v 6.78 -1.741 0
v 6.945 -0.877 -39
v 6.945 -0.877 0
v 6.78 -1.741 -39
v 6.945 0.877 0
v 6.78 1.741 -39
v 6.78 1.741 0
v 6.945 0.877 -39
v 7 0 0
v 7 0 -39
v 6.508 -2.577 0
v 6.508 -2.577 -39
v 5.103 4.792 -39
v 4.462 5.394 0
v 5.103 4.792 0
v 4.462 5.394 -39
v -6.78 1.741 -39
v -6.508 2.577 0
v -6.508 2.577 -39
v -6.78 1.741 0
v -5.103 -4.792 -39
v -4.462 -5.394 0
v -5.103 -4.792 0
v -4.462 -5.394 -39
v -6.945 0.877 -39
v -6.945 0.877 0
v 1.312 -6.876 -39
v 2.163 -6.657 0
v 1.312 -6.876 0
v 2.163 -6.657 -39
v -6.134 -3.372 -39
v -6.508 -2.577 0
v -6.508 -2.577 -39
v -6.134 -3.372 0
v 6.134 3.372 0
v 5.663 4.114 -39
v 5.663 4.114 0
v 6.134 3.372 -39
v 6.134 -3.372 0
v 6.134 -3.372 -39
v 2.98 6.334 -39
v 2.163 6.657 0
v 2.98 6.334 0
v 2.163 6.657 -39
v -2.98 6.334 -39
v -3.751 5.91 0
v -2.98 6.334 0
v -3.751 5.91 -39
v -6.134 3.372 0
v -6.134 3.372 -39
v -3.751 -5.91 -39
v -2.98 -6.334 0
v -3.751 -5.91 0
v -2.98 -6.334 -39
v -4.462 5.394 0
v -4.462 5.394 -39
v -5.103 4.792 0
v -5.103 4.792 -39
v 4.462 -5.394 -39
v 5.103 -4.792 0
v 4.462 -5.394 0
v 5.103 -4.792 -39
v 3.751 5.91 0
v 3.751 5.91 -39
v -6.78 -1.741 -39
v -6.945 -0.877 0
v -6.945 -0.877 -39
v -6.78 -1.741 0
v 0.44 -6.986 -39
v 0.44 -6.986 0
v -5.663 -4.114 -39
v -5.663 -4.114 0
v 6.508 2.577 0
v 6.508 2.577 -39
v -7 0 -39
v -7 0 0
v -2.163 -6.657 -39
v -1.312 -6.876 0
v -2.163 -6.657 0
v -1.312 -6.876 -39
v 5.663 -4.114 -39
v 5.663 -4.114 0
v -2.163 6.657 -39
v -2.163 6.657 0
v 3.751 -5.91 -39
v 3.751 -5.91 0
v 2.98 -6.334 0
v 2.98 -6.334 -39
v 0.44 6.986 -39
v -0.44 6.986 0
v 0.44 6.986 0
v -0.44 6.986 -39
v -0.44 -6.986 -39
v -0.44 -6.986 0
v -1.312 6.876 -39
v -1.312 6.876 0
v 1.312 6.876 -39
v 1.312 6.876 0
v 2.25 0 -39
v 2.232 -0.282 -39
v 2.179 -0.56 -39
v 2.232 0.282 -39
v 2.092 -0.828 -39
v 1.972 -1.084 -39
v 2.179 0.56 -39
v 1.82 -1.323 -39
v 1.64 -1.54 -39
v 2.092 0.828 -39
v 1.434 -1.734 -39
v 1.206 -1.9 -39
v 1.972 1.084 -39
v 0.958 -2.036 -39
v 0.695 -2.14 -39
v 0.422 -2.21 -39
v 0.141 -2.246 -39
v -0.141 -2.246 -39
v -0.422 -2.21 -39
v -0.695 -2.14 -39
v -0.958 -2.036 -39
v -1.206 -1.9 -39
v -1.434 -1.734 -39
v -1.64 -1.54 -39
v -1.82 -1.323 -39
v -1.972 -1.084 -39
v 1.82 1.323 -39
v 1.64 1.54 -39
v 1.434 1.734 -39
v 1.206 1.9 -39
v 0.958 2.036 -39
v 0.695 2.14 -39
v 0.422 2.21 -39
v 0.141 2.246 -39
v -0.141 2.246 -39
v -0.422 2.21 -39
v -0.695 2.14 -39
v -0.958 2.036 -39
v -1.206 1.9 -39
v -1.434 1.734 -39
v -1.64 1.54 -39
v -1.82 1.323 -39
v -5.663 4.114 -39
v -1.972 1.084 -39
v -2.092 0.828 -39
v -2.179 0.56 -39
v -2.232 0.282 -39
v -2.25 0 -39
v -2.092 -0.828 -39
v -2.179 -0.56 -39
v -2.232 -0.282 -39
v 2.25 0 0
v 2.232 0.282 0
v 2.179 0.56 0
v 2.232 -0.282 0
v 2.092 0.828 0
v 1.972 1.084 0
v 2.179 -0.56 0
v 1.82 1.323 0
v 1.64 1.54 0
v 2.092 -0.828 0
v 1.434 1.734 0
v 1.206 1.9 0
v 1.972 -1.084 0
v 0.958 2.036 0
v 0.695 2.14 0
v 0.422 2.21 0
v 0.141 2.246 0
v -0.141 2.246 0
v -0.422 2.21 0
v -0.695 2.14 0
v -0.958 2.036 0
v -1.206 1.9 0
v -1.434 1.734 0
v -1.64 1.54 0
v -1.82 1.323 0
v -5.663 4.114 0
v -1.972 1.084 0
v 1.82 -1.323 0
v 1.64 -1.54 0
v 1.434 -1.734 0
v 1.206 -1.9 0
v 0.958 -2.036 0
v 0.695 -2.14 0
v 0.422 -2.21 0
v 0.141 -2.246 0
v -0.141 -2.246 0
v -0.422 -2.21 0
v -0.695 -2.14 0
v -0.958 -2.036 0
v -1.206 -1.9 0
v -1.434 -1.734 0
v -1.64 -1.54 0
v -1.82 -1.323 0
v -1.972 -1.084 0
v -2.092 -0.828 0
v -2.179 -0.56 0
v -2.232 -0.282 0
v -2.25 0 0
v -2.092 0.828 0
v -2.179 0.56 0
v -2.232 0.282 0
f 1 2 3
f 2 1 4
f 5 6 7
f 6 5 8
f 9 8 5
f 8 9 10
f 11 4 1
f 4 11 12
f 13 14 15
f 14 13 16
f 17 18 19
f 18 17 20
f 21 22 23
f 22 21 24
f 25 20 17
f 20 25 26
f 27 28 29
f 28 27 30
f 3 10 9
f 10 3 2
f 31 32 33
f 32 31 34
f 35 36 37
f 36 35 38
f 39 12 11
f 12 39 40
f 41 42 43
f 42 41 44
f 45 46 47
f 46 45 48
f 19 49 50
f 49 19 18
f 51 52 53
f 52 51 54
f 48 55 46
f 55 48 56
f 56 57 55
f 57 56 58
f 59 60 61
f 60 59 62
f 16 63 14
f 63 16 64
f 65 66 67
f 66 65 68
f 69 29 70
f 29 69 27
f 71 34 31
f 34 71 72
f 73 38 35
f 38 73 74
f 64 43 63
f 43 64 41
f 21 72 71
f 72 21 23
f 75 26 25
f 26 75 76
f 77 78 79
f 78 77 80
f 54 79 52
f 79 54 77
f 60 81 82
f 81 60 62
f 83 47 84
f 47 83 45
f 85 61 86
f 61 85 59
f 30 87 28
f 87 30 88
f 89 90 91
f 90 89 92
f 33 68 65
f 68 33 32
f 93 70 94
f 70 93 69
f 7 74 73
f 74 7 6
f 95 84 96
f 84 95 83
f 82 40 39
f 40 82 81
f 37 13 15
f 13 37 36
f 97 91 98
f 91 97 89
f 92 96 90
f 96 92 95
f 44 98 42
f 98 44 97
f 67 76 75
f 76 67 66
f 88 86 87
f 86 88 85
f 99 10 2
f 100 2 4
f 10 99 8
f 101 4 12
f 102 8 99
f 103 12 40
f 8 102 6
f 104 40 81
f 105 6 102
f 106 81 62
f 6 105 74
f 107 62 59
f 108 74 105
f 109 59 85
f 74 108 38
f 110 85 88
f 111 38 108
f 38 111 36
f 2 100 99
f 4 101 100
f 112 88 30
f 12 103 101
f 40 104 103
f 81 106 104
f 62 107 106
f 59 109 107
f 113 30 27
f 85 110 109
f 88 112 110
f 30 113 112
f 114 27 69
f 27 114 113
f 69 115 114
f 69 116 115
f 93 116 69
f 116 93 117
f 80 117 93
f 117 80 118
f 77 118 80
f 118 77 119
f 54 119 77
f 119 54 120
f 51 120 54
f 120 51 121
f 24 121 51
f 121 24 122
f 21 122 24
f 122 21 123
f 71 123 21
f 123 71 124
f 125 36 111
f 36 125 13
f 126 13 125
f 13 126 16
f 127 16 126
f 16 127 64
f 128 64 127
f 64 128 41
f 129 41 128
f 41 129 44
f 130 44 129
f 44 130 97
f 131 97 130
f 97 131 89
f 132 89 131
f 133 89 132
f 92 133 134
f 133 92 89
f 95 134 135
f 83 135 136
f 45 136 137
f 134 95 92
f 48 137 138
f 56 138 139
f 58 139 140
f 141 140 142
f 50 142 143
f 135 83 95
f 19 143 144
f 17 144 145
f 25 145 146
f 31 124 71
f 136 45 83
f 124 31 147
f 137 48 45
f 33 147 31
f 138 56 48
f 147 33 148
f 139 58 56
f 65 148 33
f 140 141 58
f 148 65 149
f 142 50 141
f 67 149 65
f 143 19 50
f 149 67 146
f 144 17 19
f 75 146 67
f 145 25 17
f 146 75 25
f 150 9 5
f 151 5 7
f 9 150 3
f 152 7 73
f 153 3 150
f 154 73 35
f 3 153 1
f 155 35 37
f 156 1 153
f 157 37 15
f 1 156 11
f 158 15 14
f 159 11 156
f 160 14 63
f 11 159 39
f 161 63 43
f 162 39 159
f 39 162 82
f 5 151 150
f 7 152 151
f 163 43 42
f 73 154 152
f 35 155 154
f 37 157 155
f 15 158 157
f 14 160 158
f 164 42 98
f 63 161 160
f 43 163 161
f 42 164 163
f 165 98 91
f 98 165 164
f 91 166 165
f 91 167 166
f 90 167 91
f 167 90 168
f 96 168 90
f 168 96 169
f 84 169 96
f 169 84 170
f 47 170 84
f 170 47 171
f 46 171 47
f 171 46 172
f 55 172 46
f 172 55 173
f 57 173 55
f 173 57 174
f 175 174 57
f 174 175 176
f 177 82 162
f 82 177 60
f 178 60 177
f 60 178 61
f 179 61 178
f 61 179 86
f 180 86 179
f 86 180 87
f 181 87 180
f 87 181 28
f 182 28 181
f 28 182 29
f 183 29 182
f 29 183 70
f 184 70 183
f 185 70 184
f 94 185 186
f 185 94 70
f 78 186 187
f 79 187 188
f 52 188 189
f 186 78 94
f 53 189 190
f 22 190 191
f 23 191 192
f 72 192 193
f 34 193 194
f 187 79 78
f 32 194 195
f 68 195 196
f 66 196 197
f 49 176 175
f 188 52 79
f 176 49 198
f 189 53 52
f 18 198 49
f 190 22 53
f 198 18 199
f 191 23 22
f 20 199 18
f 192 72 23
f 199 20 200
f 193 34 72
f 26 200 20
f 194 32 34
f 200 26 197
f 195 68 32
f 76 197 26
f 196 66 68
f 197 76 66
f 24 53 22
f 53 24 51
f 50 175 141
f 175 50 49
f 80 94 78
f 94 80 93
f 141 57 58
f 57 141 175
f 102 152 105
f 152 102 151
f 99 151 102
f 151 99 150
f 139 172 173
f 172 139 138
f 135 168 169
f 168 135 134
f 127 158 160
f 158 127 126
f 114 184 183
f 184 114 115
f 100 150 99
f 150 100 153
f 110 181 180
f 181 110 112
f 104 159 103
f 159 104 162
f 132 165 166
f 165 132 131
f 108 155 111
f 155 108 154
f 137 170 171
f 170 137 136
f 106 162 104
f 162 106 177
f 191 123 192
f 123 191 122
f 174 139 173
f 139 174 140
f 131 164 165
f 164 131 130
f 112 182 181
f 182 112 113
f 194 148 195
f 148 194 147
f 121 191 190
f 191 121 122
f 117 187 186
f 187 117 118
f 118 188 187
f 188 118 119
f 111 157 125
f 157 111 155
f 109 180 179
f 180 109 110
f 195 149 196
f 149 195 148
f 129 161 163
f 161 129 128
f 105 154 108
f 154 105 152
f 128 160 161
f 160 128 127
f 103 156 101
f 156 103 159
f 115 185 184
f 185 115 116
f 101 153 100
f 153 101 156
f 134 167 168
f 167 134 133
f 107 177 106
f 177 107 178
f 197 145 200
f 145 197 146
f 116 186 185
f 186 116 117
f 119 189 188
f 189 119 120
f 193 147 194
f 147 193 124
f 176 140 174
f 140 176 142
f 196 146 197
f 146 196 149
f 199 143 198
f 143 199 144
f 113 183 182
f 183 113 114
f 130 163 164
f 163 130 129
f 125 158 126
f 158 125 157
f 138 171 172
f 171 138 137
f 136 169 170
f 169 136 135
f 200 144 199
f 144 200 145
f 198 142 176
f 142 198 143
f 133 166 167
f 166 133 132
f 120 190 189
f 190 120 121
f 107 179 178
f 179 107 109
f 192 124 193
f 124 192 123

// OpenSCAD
$fn = 50;


difference() {
	union() {
		translate(v = [0, 0, -39.0000000000]) {
			cylinder(h = 39, r = 7.0000000000);
		}
	}
	union() {
		#translate(v = [0, 0, -39]) {
			cylinder(h = 39, r = 2.2500000000);
		}
	}
}
